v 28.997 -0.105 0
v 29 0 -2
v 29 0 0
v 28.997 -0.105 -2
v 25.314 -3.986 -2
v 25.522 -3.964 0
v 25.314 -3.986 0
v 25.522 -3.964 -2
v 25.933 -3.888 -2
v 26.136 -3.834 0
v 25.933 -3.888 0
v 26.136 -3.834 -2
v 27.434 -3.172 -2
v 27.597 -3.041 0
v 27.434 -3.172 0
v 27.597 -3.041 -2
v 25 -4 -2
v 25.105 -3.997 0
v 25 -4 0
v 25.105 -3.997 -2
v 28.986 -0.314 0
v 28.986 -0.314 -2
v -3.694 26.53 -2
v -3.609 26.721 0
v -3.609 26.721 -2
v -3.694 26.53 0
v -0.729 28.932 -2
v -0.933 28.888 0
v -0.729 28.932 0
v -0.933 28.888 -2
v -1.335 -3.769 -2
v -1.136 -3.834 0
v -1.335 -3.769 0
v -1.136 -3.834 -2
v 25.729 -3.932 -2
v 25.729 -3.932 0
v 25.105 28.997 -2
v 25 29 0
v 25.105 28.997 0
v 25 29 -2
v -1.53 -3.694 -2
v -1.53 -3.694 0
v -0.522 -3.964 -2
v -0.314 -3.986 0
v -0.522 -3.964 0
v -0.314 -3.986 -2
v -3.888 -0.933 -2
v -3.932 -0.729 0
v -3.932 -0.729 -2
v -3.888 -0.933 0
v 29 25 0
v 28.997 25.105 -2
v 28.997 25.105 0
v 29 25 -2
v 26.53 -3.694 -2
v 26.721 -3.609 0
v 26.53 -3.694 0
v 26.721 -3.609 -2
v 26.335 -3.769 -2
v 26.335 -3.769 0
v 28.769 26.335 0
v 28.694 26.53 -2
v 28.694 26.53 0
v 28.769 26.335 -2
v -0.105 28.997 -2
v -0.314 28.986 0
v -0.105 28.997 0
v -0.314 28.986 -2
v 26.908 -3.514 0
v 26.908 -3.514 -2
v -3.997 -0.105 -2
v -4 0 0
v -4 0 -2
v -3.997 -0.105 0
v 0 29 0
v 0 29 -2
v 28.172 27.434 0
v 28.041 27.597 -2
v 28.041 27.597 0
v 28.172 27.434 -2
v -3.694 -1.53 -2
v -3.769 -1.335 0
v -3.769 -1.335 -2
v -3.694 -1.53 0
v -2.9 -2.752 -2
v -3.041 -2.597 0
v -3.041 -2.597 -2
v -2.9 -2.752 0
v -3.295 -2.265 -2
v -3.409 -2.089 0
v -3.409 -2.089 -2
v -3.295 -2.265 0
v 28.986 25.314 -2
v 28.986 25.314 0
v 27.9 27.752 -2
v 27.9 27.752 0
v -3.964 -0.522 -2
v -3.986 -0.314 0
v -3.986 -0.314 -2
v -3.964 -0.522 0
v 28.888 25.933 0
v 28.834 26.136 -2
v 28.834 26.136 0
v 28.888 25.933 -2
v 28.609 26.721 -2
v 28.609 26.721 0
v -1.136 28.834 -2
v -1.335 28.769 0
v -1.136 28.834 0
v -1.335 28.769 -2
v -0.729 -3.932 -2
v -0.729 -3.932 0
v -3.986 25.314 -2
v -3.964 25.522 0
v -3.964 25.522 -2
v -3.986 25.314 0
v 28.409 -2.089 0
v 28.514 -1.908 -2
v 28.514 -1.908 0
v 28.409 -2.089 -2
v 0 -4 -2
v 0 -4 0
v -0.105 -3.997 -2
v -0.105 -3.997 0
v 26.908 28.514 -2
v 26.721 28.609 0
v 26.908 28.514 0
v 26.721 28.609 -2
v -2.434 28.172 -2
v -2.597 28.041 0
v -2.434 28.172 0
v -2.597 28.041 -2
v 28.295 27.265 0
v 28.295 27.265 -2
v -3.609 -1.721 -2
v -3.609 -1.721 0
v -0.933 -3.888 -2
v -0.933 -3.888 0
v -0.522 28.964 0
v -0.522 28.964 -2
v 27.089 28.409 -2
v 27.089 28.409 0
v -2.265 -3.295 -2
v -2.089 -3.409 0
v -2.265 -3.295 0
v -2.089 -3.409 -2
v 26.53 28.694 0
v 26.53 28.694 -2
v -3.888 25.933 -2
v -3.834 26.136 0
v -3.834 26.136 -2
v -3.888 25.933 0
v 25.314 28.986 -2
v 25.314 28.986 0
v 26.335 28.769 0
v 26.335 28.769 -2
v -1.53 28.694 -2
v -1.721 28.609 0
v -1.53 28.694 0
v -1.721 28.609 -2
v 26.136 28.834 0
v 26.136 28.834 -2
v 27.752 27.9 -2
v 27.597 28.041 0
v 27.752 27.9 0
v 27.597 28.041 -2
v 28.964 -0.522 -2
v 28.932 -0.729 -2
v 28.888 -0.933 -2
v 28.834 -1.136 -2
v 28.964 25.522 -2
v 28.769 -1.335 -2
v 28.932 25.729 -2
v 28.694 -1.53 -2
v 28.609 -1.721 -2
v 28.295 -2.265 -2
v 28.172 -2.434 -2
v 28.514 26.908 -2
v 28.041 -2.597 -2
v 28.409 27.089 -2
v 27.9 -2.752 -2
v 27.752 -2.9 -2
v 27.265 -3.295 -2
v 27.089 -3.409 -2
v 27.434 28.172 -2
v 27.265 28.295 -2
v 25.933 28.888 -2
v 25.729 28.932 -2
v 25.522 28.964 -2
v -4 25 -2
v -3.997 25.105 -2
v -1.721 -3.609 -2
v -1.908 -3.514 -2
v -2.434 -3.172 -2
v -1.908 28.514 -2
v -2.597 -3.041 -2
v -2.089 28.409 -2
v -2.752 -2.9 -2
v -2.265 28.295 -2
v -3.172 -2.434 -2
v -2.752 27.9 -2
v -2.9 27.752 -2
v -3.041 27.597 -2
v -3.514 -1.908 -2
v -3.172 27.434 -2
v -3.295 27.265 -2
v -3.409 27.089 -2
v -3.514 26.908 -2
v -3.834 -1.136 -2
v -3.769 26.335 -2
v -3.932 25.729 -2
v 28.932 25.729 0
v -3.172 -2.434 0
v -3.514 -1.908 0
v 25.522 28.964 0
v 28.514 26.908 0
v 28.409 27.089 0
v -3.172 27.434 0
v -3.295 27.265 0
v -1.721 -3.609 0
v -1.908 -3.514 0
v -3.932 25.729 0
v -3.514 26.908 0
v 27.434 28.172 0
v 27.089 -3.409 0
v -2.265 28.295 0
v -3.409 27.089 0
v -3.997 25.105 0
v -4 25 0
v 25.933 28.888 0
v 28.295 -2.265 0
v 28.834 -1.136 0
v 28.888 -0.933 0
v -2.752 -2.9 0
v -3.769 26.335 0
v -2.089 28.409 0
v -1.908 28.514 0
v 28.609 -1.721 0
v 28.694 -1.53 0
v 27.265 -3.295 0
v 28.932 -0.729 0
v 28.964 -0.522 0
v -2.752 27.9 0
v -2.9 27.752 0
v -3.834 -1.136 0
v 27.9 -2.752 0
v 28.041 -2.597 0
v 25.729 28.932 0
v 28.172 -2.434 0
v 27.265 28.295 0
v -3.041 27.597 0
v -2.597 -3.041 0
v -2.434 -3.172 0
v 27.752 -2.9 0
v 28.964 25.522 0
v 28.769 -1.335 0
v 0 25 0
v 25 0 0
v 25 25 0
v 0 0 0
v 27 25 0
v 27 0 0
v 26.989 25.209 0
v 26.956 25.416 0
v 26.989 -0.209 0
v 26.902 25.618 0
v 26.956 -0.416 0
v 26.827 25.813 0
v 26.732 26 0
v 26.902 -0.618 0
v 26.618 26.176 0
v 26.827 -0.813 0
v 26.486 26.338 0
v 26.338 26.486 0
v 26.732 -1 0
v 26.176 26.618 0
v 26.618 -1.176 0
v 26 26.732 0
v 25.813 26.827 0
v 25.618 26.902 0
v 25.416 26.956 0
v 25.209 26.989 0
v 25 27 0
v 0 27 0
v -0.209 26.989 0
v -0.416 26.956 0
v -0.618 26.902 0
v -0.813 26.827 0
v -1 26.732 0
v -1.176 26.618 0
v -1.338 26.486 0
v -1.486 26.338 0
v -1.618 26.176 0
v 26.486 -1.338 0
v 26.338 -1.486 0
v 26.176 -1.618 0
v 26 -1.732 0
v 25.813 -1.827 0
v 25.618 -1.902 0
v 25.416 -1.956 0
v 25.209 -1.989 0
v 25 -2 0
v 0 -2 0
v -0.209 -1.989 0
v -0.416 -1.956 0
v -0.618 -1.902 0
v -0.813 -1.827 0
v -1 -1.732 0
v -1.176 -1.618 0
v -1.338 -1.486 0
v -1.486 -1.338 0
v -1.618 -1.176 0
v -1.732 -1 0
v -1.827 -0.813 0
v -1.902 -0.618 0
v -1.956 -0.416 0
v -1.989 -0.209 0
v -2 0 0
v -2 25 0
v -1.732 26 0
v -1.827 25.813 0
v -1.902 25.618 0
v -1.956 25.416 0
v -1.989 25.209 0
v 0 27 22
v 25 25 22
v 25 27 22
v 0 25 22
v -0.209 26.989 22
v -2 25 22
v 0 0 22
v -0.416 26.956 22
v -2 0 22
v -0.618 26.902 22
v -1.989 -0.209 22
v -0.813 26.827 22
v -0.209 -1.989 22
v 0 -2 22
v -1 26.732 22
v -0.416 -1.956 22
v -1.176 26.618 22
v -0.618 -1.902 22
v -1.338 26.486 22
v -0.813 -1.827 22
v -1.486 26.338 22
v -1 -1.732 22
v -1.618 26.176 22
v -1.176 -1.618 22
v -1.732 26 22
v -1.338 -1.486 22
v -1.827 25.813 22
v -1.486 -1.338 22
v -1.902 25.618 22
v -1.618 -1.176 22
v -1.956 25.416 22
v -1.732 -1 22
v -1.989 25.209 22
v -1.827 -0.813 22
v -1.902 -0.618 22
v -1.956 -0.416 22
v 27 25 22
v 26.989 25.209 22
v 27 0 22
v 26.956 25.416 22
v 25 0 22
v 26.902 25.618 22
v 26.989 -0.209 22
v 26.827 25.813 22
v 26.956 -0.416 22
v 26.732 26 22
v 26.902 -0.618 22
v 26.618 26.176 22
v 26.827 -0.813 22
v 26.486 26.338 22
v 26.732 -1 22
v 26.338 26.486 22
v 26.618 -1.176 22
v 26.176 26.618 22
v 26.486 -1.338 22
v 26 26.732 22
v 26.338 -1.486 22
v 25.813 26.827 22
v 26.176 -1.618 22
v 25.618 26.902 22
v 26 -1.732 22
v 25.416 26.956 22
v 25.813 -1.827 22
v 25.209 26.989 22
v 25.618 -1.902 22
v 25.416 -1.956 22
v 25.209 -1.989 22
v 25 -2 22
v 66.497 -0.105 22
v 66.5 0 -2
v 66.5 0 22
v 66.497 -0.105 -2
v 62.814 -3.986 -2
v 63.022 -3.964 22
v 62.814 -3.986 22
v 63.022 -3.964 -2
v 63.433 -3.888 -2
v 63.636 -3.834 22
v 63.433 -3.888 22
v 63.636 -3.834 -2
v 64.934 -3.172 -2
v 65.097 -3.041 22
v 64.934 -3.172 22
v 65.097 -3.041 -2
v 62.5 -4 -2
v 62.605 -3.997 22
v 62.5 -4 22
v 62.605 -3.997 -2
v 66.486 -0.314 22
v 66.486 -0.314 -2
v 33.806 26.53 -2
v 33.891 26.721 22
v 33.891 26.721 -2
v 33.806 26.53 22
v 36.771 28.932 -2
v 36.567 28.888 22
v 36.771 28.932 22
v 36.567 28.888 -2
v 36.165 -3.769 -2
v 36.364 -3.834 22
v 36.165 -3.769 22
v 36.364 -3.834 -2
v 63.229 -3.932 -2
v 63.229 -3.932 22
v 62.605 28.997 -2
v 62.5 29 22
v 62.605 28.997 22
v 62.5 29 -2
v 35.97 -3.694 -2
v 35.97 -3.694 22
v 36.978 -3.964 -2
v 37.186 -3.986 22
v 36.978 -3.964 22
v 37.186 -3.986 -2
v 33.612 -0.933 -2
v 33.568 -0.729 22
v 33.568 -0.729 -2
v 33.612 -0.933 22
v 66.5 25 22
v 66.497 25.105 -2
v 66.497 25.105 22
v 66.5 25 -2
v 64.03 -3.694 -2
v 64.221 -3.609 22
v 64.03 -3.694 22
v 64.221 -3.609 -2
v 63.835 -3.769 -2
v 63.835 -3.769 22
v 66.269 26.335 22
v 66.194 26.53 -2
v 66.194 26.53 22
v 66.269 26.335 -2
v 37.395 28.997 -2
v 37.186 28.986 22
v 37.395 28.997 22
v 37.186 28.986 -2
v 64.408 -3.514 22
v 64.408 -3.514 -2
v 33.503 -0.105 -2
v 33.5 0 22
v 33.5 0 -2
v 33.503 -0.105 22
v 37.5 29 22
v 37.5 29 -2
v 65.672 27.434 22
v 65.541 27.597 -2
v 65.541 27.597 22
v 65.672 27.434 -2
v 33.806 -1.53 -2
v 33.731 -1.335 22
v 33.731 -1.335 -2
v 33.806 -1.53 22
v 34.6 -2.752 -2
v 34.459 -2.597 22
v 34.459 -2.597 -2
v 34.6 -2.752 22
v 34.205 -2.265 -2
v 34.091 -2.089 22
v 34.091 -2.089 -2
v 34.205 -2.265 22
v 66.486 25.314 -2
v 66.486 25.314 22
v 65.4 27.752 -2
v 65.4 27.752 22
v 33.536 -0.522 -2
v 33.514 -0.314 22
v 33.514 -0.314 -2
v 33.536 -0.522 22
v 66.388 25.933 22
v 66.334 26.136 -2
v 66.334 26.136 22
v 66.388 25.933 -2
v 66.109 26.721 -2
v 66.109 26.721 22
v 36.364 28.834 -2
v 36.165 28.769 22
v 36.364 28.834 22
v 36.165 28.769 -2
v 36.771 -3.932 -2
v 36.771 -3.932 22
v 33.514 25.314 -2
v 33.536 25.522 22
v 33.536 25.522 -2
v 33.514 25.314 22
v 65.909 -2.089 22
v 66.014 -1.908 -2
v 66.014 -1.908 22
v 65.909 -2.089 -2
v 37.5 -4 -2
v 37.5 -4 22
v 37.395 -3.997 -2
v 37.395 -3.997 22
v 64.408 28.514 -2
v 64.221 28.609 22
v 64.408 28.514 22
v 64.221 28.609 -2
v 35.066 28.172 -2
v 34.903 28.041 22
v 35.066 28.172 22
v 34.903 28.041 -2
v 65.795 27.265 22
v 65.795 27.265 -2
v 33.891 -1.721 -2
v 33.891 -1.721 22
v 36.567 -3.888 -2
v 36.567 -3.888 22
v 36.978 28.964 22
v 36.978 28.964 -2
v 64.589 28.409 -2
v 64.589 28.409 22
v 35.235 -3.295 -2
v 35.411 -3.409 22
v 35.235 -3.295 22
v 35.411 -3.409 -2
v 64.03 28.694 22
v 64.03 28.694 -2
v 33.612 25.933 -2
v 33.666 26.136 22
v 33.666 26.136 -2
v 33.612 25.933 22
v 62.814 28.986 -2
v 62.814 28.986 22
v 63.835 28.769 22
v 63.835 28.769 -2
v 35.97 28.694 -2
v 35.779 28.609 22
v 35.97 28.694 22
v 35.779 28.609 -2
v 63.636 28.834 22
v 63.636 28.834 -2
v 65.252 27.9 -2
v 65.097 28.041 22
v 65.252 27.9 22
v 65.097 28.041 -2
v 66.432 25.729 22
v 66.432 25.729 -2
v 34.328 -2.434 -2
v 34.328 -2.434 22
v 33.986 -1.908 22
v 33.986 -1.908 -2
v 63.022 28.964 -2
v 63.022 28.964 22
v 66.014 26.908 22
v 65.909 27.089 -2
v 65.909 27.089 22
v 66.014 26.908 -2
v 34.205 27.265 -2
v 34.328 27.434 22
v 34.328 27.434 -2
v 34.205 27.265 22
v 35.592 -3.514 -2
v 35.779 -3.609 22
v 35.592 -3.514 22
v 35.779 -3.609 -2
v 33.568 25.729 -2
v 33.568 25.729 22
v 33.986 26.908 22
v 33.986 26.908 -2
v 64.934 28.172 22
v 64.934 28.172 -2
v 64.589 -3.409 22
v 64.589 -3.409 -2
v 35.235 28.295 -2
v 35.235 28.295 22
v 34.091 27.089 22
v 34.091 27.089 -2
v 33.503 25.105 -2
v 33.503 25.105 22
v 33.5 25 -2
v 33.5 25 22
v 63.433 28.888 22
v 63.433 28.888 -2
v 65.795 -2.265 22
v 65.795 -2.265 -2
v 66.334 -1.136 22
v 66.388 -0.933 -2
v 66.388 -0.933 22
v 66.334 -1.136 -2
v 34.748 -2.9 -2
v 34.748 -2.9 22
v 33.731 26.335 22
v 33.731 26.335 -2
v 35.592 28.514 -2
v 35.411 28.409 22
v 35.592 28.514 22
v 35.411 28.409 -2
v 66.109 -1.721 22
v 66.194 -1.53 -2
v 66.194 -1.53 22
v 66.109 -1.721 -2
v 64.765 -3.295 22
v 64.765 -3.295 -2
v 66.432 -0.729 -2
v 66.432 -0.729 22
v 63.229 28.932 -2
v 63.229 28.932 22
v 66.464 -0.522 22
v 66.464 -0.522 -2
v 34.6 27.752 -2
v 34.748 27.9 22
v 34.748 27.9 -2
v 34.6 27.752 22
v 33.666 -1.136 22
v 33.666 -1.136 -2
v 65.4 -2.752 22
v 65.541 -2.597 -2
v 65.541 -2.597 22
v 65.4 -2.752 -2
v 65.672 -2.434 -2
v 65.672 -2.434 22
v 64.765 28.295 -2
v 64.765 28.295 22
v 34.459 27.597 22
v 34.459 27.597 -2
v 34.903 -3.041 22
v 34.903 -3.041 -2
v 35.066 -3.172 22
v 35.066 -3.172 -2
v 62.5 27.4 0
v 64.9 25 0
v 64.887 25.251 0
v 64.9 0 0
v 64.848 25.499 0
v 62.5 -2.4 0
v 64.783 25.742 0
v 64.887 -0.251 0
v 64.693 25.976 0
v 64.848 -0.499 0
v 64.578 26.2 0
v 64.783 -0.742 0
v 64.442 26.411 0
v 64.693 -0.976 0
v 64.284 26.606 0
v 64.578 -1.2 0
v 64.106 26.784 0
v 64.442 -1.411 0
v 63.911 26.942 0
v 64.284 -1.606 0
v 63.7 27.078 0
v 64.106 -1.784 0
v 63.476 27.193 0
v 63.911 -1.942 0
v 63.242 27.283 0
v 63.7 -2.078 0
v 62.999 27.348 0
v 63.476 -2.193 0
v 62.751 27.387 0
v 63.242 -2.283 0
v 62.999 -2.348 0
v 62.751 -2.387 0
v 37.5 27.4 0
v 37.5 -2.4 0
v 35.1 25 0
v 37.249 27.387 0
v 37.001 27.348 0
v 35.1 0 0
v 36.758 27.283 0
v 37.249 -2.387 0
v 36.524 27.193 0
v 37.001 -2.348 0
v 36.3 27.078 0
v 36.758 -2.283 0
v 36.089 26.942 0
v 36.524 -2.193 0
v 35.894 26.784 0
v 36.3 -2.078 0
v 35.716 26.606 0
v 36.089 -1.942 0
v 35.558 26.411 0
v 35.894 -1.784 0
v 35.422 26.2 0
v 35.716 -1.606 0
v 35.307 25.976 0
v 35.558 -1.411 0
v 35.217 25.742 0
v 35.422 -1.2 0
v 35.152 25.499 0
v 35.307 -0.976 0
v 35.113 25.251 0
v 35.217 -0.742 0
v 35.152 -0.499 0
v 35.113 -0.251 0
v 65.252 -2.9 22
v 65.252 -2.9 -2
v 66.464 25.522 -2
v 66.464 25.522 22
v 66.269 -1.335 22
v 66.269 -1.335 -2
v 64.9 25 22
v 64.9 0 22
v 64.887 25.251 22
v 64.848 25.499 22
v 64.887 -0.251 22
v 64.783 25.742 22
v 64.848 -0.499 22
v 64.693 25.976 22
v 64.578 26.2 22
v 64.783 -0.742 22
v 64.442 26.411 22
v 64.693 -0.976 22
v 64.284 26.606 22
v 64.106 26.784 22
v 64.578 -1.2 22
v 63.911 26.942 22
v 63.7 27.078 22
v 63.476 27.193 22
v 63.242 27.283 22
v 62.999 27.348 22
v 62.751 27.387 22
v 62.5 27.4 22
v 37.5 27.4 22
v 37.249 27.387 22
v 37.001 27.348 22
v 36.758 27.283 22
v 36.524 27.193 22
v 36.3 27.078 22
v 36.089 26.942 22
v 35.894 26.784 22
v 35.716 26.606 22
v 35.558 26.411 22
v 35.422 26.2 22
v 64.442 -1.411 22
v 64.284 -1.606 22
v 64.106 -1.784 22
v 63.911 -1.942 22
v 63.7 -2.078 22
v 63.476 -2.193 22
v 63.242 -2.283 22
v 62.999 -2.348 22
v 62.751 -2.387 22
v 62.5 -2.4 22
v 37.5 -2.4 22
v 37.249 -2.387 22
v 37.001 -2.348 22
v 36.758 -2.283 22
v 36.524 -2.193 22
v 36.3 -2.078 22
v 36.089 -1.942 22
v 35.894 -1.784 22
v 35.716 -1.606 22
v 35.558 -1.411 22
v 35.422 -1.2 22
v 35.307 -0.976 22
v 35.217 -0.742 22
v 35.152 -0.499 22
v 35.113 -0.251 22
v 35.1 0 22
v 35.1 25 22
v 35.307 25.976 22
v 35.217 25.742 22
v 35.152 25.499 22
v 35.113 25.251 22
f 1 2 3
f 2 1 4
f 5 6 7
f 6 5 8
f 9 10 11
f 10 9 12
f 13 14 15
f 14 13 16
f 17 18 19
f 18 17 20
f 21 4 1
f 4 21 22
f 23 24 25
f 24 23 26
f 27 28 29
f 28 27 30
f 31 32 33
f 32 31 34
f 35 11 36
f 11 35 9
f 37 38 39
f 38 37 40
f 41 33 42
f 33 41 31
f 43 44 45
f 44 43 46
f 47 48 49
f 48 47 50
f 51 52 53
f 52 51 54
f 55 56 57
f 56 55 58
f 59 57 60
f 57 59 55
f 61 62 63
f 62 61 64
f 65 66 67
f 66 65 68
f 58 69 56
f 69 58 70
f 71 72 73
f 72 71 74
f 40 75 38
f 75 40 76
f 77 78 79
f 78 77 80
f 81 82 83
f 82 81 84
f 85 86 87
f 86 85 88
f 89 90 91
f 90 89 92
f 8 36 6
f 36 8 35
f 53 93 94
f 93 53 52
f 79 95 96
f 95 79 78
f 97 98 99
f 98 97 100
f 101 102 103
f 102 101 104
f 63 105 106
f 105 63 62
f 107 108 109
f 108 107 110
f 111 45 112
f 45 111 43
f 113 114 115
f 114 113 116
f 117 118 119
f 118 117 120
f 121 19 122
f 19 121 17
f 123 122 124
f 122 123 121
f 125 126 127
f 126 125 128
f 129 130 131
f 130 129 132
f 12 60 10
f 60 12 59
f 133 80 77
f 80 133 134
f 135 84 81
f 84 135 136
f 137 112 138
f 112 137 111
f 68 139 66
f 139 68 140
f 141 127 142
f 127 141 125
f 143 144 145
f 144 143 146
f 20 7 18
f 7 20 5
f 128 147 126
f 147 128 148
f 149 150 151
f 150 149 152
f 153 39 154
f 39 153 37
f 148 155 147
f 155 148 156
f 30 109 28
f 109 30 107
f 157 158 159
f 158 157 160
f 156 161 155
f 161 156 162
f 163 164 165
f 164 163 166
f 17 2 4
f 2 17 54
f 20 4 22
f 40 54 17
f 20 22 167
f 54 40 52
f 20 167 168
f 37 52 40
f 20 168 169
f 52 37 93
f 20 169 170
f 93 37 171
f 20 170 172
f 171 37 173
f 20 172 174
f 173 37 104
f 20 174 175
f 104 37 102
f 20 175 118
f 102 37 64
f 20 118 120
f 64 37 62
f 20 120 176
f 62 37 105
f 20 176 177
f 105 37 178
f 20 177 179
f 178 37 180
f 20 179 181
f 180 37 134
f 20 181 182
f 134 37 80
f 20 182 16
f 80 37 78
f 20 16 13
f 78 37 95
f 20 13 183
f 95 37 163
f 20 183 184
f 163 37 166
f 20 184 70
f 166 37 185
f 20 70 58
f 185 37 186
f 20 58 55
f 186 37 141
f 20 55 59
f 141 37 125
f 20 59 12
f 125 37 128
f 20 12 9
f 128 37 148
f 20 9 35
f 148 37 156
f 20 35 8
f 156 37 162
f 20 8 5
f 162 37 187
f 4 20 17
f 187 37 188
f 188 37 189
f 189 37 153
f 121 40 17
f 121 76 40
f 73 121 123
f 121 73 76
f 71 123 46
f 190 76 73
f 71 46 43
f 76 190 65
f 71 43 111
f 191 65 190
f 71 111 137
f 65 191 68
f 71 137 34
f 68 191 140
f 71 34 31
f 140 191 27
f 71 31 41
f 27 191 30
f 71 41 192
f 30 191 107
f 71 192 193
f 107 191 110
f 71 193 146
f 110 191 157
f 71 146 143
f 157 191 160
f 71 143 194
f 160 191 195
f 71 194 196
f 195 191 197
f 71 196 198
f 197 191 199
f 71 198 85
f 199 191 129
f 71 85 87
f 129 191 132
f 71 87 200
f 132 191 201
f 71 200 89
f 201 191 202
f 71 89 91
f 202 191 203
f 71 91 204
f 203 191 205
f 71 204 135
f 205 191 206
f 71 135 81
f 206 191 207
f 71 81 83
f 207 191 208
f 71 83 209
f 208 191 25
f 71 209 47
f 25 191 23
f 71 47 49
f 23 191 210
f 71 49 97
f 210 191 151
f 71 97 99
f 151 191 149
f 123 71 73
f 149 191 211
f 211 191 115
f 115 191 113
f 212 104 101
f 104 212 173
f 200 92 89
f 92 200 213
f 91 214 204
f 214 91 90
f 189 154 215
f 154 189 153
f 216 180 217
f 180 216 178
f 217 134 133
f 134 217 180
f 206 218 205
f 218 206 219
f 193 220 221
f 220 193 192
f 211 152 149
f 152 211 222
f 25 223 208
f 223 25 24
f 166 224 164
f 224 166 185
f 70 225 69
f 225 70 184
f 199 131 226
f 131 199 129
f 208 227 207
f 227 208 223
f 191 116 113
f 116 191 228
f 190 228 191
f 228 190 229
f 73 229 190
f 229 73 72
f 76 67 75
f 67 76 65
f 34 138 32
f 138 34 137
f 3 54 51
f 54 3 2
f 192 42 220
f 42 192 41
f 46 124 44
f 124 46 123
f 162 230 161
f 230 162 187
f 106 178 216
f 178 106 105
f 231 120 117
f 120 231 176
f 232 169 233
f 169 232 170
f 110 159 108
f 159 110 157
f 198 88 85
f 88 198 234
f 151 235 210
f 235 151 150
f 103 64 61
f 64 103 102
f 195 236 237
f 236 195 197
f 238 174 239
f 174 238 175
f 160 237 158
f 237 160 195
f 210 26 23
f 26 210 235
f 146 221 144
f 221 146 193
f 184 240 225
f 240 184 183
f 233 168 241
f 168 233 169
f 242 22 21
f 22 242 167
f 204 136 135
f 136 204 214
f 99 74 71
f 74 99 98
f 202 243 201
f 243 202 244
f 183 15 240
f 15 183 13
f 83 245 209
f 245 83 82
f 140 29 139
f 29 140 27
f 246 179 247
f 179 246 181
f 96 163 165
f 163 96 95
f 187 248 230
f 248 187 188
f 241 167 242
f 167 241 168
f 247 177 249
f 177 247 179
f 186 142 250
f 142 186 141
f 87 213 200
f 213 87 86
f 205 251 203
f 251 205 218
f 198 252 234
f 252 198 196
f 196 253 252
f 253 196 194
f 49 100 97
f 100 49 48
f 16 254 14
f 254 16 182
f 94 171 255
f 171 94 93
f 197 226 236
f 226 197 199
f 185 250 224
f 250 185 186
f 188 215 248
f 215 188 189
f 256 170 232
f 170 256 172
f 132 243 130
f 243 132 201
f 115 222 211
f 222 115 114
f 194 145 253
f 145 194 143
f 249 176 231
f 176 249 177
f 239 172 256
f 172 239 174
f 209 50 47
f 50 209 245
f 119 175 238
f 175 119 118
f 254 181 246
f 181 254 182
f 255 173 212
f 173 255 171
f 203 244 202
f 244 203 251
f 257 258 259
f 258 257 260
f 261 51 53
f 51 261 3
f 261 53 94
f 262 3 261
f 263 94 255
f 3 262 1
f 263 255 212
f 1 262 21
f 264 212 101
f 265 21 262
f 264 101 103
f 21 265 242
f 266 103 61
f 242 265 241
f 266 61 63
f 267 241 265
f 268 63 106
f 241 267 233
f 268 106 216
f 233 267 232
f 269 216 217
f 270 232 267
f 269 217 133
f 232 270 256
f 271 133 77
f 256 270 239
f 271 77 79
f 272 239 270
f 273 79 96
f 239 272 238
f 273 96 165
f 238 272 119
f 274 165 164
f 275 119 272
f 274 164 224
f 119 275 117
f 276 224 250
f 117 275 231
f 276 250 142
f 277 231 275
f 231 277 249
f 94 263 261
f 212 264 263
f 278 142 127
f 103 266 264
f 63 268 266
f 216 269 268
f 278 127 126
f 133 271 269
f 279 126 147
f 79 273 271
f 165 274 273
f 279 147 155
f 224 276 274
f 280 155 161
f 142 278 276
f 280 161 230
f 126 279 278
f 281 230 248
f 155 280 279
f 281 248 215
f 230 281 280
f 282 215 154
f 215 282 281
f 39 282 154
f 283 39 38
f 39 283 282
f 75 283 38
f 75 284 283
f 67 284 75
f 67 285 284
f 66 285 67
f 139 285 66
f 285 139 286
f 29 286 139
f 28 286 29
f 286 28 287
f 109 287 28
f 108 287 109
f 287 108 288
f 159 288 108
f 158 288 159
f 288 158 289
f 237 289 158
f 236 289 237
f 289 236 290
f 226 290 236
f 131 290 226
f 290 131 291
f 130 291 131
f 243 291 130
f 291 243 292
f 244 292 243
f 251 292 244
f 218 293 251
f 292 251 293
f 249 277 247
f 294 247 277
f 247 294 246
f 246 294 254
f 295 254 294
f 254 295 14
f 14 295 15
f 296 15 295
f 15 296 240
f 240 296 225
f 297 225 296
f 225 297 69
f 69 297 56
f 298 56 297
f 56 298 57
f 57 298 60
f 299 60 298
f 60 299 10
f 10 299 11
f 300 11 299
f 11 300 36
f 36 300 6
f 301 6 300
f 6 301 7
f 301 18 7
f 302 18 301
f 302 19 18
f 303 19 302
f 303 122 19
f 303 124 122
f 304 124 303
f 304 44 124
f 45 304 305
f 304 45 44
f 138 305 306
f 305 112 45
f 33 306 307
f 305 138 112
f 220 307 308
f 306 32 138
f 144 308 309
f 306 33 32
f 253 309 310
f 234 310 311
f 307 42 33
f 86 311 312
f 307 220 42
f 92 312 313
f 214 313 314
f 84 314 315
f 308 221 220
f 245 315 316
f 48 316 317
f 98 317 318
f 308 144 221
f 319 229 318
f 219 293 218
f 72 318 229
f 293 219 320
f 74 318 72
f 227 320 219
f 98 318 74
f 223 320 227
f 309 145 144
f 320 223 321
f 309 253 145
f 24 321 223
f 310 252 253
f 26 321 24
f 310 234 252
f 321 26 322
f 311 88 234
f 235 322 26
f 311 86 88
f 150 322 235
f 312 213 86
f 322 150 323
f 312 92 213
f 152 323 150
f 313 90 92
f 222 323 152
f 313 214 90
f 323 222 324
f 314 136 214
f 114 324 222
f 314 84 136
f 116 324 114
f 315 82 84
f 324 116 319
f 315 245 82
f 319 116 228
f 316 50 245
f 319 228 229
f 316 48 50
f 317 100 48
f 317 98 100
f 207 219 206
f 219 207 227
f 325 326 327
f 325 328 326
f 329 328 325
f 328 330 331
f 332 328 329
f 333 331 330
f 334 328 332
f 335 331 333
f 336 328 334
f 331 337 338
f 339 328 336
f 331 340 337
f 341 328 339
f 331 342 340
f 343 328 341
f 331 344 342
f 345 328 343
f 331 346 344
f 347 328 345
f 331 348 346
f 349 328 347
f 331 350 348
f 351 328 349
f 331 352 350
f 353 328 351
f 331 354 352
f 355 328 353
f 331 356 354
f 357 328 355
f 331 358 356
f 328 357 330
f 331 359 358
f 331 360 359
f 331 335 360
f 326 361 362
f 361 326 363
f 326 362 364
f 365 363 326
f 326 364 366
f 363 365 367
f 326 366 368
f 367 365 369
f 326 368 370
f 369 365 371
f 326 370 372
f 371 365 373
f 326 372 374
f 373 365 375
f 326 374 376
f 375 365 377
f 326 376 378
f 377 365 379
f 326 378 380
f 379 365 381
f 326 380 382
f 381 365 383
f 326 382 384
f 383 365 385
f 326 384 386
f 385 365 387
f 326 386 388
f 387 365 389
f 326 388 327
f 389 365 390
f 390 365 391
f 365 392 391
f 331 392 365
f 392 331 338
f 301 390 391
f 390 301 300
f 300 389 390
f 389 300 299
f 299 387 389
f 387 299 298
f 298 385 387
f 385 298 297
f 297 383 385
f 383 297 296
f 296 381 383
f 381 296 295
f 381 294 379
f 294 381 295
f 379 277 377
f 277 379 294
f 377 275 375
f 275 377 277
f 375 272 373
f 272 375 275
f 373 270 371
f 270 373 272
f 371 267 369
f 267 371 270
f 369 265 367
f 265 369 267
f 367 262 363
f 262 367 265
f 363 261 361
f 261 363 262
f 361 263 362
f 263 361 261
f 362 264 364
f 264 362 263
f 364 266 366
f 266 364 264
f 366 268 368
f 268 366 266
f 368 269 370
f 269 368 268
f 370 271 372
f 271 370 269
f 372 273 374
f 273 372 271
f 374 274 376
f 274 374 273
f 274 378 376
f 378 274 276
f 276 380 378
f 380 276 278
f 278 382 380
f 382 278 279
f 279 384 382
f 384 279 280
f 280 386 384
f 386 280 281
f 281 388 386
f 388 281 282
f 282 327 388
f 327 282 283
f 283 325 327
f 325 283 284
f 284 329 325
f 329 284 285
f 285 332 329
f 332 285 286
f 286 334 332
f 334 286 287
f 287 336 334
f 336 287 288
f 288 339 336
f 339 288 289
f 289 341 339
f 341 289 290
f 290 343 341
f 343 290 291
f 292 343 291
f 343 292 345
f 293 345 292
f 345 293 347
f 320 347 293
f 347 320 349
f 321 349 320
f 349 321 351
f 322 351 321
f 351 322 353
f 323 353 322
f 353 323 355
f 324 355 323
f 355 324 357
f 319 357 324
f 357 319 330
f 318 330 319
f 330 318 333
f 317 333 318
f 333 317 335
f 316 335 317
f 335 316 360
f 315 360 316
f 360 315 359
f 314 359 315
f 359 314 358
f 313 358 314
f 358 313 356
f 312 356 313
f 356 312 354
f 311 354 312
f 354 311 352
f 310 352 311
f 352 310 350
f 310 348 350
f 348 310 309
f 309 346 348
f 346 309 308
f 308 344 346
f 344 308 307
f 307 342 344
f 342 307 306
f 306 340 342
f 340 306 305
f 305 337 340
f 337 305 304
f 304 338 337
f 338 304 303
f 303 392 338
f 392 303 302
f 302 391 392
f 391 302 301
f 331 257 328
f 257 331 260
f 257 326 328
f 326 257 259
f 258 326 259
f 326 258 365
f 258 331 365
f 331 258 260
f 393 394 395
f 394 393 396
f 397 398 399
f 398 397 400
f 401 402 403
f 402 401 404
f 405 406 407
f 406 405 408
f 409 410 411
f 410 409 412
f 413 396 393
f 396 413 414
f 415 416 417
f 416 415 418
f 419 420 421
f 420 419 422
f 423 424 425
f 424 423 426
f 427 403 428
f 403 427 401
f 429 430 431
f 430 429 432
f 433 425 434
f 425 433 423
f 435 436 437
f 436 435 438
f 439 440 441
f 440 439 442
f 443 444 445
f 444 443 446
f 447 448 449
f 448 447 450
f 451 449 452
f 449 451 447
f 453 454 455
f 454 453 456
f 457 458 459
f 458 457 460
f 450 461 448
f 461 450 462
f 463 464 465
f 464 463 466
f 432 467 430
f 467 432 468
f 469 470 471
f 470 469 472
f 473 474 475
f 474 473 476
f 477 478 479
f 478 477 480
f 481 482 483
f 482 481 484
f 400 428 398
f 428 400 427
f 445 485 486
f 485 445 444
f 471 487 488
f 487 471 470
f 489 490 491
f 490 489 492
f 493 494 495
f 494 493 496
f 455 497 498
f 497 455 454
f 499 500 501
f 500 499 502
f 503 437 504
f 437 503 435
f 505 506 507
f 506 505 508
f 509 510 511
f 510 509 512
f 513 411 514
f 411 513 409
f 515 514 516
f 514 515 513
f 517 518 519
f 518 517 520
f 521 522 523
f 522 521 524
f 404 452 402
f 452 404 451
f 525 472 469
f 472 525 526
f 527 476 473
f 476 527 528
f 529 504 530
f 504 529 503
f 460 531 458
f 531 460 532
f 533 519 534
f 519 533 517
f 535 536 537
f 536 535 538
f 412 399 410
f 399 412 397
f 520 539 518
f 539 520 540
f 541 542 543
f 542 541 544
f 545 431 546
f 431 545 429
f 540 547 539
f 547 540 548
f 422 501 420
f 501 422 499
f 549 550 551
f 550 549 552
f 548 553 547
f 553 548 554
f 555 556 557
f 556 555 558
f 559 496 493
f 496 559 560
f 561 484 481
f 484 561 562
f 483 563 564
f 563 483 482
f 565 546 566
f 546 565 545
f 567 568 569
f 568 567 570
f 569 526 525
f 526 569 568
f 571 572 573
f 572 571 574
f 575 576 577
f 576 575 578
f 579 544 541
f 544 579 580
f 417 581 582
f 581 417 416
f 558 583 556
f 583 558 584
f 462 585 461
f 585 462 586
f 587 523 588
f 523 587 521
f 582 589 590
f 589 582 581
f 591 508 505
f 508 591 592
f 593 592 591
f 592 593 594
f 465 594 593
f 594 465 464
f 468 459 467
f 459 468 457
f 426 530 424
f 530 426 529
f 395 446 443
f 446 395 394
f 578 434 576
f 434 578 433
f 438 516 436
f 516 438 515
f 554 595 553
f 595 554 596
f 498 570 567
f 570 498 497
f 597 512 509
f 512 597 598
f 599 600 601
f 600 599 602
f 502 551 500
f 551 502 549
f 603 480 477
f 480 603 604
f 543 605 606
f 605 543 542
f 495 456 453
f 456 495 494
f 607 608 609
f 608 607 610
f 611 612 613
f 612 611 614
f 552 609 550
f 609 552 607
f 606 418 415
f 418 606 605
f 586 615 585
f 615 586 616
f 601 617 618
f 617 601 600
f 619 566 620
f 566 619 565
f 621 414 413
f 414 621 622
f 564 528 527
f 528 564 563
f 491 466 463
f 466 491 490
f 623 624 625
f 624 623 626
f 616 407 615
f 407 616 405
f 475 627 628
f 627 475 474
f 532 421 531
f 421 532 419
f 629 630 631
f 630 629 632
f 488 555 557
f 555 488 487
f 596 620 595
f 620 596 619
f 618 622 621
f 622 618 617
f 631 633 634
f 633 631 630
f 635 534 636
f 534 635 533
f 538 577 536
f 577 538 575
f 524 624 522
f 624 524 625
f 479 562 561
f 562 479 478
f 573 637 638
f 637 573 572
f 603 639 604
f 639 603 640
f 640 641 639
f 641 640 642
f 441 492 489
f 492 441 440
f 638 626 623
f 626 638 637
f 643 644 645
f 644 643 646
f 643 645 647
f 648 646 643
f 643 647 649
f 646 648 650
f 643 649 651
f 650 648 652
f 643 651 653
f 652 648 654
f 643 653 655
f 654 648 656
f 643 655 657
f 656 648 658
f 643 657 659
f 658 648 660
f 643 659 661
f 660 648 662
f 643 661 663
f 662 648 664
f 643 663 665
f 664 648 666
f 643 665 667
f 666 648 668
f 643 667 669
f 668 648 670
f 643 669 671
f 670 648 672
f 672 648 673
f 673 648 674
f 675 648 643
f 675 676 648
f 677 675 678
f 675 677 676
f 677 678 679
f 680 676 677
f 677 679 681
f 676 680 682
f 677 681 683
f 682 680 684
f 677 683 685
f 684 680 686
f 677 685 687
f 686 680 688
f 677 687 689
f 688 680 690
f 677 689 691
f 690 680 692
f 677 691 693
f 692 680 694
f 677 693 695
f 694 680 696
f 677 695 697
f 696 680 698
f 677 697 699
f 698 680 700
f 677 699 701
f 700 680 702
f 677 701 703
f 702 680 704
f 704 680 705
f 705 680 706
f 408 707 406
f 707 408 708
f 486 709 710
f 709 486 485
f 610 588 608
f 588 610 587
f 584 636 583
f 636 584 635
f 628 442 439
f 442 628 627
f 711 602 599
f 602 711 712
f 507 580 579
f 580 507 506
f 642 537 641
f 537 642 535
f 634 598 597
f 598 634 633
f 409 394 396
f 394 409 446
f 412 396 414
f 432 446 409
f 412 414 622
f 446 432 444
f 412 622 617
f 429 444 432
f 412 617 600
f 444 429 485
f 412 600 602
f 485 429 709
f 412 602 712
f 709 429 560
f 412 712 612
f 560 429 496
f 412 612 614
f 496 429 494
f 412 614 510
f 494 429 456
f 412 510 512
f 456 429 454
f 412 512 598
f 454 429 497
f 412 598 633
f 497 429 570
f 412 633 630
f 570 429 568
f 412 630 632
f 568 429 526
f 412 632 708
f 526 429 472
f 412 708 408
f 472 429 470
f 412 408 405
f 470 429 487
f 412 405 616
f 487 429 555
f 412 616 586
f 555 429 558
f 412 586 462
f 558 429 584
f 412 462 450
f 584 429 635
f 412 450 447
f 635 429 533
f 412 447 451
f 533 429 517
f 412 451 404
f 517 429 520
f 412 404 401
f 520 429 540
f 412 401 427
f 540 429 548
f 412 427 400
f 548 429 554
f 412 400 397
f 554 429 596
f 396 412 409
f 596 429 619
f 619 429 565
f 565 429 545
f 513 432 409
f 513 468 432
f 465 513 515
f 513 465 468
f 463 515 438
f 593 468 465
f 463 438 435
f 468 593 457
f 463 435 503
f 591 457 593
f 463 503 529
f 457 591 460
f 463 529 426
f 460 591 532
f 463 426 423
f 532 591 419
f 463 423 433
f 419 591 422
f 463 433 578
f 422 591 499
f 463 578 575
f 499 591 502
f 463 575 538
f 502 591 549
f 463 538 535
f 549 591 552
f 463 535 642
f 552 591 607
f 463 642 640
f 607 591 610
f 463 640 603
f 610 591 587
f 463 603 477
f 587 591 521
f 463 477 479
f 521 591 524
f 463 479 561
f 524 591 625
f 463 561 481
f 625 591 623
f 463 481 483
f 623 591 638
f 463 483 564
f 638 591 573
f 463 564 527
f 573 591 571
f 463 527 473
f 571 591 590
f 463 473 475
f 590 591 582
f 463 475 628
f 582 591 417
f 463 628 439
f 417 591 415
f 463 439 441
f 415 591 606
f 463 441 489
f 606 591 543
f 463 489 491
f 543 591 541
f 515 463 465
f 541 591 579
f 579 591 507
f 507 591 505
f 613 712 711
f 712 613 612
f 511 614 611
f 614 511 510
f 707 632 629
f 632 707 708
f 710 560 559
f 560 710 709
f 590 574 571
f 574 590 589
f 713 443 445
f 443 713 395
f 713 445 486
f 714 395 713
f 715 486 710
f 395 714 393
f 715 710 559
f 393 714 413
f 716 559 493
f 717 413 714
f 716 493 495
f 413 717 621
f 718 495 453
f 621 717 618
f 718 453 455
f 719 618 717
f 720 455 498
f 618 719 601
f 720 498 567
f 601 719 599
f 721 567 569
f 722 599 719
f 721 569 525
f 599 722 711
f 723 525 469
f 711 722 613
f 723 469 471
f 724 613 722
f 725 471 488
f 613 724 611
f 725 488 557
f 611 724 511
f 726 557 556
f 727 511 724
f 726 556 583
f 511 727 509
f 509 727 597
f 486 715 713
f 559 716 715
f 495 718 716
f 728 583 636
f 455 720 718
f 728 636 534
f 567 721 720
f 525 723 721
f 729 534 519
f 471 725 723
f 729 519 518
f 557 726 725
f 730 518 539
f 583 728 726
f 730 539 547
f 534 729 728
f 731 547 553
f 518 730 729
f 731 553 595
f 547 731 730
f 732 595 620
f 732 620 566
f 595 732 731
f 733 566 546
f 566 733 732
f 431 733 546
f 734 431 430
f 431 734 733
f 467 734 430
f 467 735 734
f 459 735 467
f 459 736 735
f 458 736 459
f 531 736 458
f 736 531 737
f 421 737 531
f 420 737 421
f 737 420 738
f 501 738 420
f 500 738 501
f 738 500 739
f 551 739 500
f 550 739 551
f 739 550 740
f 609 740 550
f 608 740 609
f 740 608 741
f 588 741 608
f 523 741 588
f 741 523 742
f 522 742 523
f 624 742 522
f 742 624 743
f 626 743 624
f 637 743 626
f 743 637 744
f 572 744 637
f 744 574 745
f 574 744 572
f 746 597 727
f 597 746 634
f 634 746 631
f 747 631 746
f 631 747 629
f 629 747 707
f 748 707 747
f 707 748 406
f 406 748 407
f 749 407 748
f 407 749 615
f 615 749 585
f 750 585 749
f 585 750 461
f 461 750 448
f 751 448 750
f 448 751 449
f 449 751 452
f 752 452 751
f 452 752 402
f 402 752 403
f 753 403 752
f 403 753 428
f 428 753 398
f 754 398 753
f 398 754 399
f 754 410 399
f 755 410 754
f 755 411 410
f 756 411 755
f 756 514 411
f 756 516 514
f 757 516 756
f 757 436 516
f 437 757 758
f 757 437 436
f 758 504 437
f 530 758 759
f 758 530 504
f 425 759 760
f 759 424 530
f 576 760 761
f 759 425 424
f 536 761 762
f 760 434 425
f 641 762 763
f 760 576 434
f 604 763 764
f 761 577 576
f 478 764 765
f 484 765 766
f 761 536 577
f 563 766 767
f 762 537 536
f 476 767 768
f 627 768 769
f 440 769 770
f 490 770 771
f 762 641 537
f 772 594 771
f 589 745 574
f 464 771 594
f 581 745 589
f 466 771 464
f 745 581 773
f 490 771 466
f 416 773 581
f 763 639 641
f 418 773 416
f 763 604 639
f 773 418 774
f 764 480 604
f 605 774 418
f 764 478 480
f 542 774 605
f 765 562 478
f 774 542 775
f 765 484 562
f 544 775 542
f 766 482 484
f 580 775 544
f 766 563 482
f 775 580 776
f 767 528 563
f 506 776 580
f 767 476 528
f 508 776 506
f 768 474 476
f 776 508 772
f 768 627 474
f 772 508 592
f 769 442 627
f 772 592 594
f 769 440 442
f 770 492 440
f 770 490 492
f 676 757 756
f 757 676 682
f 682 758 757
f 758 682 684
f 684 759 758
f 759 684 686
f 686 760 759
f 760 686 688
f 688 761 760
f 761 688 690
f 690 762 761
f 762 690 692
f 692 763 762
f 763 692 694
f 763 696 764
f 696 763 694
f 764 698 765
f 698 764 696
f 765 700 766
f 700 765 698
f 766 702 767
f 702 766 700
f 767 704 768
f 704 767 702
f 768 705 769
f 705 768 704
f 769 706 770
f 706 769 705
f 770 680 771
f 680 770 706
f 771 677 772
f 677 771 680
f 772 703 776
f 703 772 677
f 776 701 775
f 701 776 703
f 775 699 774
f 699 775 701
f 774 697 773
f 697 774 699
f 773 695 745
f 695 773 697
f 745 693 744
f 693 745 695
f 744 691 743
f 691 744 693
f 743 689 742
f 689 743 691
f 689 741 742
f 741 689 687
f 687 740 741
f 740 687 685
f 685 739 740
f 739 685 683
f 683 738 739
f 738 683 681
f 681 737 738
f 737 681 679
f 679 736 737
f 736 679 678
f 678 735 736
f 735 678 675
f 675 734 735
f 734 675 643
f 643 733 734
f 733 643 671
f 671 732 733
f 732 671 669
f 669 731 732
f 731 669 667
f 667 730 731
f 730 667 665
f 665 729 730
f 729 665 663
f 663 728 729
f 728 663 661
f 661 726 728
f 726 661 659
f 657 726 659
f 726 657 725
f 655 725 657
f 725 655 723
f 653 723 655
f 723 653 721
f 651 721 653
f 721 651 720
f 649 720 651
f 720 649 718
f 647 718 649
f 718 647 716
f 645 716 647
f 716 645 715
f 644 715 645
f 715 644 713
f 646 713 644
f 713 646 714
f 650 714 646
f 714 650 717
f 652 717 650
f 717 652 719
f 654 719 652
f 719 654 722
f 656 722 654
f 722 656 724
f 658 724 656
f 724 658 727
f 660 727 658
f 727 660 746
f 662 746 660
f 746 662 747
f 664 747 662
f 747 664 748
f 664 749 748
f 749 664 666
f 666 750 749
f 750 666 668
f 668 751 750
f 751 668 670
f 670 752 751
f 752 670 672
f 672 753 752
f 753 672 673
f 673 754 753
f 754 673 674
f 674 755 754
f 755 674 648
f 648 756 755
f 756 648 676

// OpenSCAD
$fn = 60;

buffer = 5;
thickness = 0.4 * buffer;
separator = thickness;
box_x = 25; // Save room for wall
box_y = 25; // Toothbrush Length
z = 22;     // Tallest thing is the toothpaste tube

INNER_TOLERANCE = 0.4; // 0.2 is almost too tight

union()
{
    // bottom
    translate([ 0, 0, -thickness ])
    {
        linear_extrude(height = thickness)
        {
            offset(thickness) offset(thickness) square([ box_x, box_y ]);
        }
    }

    // OUTER BOX
    linear_extrude(height = z)
    {
        difference()
        {
            offset(thickness) square([ box_x, box_y ]);
            square([ box_x, box_y ]);
        }
    }
}

// Top

// bottom
translate([ box_x + (0.5 * box_x), 0, 0 ]) union()
{
    translate([ 0, 0, -thickness ])
    {
        linear_extrude(height = thickness)
        {

            offset(thickness) offset(thickness) square([ box_x, box_y ]);
        }
    }
    translate([ 0, 0, 0 ]) linear_extrude(height = z)
    {
        difference()
        {
            offset(thickness) offset(thickness) square([ box_x, box_y ]);
            offset(thickness + INNER_TOLERANCE) square([ box_x, box_y ]);
        }
    }
}
